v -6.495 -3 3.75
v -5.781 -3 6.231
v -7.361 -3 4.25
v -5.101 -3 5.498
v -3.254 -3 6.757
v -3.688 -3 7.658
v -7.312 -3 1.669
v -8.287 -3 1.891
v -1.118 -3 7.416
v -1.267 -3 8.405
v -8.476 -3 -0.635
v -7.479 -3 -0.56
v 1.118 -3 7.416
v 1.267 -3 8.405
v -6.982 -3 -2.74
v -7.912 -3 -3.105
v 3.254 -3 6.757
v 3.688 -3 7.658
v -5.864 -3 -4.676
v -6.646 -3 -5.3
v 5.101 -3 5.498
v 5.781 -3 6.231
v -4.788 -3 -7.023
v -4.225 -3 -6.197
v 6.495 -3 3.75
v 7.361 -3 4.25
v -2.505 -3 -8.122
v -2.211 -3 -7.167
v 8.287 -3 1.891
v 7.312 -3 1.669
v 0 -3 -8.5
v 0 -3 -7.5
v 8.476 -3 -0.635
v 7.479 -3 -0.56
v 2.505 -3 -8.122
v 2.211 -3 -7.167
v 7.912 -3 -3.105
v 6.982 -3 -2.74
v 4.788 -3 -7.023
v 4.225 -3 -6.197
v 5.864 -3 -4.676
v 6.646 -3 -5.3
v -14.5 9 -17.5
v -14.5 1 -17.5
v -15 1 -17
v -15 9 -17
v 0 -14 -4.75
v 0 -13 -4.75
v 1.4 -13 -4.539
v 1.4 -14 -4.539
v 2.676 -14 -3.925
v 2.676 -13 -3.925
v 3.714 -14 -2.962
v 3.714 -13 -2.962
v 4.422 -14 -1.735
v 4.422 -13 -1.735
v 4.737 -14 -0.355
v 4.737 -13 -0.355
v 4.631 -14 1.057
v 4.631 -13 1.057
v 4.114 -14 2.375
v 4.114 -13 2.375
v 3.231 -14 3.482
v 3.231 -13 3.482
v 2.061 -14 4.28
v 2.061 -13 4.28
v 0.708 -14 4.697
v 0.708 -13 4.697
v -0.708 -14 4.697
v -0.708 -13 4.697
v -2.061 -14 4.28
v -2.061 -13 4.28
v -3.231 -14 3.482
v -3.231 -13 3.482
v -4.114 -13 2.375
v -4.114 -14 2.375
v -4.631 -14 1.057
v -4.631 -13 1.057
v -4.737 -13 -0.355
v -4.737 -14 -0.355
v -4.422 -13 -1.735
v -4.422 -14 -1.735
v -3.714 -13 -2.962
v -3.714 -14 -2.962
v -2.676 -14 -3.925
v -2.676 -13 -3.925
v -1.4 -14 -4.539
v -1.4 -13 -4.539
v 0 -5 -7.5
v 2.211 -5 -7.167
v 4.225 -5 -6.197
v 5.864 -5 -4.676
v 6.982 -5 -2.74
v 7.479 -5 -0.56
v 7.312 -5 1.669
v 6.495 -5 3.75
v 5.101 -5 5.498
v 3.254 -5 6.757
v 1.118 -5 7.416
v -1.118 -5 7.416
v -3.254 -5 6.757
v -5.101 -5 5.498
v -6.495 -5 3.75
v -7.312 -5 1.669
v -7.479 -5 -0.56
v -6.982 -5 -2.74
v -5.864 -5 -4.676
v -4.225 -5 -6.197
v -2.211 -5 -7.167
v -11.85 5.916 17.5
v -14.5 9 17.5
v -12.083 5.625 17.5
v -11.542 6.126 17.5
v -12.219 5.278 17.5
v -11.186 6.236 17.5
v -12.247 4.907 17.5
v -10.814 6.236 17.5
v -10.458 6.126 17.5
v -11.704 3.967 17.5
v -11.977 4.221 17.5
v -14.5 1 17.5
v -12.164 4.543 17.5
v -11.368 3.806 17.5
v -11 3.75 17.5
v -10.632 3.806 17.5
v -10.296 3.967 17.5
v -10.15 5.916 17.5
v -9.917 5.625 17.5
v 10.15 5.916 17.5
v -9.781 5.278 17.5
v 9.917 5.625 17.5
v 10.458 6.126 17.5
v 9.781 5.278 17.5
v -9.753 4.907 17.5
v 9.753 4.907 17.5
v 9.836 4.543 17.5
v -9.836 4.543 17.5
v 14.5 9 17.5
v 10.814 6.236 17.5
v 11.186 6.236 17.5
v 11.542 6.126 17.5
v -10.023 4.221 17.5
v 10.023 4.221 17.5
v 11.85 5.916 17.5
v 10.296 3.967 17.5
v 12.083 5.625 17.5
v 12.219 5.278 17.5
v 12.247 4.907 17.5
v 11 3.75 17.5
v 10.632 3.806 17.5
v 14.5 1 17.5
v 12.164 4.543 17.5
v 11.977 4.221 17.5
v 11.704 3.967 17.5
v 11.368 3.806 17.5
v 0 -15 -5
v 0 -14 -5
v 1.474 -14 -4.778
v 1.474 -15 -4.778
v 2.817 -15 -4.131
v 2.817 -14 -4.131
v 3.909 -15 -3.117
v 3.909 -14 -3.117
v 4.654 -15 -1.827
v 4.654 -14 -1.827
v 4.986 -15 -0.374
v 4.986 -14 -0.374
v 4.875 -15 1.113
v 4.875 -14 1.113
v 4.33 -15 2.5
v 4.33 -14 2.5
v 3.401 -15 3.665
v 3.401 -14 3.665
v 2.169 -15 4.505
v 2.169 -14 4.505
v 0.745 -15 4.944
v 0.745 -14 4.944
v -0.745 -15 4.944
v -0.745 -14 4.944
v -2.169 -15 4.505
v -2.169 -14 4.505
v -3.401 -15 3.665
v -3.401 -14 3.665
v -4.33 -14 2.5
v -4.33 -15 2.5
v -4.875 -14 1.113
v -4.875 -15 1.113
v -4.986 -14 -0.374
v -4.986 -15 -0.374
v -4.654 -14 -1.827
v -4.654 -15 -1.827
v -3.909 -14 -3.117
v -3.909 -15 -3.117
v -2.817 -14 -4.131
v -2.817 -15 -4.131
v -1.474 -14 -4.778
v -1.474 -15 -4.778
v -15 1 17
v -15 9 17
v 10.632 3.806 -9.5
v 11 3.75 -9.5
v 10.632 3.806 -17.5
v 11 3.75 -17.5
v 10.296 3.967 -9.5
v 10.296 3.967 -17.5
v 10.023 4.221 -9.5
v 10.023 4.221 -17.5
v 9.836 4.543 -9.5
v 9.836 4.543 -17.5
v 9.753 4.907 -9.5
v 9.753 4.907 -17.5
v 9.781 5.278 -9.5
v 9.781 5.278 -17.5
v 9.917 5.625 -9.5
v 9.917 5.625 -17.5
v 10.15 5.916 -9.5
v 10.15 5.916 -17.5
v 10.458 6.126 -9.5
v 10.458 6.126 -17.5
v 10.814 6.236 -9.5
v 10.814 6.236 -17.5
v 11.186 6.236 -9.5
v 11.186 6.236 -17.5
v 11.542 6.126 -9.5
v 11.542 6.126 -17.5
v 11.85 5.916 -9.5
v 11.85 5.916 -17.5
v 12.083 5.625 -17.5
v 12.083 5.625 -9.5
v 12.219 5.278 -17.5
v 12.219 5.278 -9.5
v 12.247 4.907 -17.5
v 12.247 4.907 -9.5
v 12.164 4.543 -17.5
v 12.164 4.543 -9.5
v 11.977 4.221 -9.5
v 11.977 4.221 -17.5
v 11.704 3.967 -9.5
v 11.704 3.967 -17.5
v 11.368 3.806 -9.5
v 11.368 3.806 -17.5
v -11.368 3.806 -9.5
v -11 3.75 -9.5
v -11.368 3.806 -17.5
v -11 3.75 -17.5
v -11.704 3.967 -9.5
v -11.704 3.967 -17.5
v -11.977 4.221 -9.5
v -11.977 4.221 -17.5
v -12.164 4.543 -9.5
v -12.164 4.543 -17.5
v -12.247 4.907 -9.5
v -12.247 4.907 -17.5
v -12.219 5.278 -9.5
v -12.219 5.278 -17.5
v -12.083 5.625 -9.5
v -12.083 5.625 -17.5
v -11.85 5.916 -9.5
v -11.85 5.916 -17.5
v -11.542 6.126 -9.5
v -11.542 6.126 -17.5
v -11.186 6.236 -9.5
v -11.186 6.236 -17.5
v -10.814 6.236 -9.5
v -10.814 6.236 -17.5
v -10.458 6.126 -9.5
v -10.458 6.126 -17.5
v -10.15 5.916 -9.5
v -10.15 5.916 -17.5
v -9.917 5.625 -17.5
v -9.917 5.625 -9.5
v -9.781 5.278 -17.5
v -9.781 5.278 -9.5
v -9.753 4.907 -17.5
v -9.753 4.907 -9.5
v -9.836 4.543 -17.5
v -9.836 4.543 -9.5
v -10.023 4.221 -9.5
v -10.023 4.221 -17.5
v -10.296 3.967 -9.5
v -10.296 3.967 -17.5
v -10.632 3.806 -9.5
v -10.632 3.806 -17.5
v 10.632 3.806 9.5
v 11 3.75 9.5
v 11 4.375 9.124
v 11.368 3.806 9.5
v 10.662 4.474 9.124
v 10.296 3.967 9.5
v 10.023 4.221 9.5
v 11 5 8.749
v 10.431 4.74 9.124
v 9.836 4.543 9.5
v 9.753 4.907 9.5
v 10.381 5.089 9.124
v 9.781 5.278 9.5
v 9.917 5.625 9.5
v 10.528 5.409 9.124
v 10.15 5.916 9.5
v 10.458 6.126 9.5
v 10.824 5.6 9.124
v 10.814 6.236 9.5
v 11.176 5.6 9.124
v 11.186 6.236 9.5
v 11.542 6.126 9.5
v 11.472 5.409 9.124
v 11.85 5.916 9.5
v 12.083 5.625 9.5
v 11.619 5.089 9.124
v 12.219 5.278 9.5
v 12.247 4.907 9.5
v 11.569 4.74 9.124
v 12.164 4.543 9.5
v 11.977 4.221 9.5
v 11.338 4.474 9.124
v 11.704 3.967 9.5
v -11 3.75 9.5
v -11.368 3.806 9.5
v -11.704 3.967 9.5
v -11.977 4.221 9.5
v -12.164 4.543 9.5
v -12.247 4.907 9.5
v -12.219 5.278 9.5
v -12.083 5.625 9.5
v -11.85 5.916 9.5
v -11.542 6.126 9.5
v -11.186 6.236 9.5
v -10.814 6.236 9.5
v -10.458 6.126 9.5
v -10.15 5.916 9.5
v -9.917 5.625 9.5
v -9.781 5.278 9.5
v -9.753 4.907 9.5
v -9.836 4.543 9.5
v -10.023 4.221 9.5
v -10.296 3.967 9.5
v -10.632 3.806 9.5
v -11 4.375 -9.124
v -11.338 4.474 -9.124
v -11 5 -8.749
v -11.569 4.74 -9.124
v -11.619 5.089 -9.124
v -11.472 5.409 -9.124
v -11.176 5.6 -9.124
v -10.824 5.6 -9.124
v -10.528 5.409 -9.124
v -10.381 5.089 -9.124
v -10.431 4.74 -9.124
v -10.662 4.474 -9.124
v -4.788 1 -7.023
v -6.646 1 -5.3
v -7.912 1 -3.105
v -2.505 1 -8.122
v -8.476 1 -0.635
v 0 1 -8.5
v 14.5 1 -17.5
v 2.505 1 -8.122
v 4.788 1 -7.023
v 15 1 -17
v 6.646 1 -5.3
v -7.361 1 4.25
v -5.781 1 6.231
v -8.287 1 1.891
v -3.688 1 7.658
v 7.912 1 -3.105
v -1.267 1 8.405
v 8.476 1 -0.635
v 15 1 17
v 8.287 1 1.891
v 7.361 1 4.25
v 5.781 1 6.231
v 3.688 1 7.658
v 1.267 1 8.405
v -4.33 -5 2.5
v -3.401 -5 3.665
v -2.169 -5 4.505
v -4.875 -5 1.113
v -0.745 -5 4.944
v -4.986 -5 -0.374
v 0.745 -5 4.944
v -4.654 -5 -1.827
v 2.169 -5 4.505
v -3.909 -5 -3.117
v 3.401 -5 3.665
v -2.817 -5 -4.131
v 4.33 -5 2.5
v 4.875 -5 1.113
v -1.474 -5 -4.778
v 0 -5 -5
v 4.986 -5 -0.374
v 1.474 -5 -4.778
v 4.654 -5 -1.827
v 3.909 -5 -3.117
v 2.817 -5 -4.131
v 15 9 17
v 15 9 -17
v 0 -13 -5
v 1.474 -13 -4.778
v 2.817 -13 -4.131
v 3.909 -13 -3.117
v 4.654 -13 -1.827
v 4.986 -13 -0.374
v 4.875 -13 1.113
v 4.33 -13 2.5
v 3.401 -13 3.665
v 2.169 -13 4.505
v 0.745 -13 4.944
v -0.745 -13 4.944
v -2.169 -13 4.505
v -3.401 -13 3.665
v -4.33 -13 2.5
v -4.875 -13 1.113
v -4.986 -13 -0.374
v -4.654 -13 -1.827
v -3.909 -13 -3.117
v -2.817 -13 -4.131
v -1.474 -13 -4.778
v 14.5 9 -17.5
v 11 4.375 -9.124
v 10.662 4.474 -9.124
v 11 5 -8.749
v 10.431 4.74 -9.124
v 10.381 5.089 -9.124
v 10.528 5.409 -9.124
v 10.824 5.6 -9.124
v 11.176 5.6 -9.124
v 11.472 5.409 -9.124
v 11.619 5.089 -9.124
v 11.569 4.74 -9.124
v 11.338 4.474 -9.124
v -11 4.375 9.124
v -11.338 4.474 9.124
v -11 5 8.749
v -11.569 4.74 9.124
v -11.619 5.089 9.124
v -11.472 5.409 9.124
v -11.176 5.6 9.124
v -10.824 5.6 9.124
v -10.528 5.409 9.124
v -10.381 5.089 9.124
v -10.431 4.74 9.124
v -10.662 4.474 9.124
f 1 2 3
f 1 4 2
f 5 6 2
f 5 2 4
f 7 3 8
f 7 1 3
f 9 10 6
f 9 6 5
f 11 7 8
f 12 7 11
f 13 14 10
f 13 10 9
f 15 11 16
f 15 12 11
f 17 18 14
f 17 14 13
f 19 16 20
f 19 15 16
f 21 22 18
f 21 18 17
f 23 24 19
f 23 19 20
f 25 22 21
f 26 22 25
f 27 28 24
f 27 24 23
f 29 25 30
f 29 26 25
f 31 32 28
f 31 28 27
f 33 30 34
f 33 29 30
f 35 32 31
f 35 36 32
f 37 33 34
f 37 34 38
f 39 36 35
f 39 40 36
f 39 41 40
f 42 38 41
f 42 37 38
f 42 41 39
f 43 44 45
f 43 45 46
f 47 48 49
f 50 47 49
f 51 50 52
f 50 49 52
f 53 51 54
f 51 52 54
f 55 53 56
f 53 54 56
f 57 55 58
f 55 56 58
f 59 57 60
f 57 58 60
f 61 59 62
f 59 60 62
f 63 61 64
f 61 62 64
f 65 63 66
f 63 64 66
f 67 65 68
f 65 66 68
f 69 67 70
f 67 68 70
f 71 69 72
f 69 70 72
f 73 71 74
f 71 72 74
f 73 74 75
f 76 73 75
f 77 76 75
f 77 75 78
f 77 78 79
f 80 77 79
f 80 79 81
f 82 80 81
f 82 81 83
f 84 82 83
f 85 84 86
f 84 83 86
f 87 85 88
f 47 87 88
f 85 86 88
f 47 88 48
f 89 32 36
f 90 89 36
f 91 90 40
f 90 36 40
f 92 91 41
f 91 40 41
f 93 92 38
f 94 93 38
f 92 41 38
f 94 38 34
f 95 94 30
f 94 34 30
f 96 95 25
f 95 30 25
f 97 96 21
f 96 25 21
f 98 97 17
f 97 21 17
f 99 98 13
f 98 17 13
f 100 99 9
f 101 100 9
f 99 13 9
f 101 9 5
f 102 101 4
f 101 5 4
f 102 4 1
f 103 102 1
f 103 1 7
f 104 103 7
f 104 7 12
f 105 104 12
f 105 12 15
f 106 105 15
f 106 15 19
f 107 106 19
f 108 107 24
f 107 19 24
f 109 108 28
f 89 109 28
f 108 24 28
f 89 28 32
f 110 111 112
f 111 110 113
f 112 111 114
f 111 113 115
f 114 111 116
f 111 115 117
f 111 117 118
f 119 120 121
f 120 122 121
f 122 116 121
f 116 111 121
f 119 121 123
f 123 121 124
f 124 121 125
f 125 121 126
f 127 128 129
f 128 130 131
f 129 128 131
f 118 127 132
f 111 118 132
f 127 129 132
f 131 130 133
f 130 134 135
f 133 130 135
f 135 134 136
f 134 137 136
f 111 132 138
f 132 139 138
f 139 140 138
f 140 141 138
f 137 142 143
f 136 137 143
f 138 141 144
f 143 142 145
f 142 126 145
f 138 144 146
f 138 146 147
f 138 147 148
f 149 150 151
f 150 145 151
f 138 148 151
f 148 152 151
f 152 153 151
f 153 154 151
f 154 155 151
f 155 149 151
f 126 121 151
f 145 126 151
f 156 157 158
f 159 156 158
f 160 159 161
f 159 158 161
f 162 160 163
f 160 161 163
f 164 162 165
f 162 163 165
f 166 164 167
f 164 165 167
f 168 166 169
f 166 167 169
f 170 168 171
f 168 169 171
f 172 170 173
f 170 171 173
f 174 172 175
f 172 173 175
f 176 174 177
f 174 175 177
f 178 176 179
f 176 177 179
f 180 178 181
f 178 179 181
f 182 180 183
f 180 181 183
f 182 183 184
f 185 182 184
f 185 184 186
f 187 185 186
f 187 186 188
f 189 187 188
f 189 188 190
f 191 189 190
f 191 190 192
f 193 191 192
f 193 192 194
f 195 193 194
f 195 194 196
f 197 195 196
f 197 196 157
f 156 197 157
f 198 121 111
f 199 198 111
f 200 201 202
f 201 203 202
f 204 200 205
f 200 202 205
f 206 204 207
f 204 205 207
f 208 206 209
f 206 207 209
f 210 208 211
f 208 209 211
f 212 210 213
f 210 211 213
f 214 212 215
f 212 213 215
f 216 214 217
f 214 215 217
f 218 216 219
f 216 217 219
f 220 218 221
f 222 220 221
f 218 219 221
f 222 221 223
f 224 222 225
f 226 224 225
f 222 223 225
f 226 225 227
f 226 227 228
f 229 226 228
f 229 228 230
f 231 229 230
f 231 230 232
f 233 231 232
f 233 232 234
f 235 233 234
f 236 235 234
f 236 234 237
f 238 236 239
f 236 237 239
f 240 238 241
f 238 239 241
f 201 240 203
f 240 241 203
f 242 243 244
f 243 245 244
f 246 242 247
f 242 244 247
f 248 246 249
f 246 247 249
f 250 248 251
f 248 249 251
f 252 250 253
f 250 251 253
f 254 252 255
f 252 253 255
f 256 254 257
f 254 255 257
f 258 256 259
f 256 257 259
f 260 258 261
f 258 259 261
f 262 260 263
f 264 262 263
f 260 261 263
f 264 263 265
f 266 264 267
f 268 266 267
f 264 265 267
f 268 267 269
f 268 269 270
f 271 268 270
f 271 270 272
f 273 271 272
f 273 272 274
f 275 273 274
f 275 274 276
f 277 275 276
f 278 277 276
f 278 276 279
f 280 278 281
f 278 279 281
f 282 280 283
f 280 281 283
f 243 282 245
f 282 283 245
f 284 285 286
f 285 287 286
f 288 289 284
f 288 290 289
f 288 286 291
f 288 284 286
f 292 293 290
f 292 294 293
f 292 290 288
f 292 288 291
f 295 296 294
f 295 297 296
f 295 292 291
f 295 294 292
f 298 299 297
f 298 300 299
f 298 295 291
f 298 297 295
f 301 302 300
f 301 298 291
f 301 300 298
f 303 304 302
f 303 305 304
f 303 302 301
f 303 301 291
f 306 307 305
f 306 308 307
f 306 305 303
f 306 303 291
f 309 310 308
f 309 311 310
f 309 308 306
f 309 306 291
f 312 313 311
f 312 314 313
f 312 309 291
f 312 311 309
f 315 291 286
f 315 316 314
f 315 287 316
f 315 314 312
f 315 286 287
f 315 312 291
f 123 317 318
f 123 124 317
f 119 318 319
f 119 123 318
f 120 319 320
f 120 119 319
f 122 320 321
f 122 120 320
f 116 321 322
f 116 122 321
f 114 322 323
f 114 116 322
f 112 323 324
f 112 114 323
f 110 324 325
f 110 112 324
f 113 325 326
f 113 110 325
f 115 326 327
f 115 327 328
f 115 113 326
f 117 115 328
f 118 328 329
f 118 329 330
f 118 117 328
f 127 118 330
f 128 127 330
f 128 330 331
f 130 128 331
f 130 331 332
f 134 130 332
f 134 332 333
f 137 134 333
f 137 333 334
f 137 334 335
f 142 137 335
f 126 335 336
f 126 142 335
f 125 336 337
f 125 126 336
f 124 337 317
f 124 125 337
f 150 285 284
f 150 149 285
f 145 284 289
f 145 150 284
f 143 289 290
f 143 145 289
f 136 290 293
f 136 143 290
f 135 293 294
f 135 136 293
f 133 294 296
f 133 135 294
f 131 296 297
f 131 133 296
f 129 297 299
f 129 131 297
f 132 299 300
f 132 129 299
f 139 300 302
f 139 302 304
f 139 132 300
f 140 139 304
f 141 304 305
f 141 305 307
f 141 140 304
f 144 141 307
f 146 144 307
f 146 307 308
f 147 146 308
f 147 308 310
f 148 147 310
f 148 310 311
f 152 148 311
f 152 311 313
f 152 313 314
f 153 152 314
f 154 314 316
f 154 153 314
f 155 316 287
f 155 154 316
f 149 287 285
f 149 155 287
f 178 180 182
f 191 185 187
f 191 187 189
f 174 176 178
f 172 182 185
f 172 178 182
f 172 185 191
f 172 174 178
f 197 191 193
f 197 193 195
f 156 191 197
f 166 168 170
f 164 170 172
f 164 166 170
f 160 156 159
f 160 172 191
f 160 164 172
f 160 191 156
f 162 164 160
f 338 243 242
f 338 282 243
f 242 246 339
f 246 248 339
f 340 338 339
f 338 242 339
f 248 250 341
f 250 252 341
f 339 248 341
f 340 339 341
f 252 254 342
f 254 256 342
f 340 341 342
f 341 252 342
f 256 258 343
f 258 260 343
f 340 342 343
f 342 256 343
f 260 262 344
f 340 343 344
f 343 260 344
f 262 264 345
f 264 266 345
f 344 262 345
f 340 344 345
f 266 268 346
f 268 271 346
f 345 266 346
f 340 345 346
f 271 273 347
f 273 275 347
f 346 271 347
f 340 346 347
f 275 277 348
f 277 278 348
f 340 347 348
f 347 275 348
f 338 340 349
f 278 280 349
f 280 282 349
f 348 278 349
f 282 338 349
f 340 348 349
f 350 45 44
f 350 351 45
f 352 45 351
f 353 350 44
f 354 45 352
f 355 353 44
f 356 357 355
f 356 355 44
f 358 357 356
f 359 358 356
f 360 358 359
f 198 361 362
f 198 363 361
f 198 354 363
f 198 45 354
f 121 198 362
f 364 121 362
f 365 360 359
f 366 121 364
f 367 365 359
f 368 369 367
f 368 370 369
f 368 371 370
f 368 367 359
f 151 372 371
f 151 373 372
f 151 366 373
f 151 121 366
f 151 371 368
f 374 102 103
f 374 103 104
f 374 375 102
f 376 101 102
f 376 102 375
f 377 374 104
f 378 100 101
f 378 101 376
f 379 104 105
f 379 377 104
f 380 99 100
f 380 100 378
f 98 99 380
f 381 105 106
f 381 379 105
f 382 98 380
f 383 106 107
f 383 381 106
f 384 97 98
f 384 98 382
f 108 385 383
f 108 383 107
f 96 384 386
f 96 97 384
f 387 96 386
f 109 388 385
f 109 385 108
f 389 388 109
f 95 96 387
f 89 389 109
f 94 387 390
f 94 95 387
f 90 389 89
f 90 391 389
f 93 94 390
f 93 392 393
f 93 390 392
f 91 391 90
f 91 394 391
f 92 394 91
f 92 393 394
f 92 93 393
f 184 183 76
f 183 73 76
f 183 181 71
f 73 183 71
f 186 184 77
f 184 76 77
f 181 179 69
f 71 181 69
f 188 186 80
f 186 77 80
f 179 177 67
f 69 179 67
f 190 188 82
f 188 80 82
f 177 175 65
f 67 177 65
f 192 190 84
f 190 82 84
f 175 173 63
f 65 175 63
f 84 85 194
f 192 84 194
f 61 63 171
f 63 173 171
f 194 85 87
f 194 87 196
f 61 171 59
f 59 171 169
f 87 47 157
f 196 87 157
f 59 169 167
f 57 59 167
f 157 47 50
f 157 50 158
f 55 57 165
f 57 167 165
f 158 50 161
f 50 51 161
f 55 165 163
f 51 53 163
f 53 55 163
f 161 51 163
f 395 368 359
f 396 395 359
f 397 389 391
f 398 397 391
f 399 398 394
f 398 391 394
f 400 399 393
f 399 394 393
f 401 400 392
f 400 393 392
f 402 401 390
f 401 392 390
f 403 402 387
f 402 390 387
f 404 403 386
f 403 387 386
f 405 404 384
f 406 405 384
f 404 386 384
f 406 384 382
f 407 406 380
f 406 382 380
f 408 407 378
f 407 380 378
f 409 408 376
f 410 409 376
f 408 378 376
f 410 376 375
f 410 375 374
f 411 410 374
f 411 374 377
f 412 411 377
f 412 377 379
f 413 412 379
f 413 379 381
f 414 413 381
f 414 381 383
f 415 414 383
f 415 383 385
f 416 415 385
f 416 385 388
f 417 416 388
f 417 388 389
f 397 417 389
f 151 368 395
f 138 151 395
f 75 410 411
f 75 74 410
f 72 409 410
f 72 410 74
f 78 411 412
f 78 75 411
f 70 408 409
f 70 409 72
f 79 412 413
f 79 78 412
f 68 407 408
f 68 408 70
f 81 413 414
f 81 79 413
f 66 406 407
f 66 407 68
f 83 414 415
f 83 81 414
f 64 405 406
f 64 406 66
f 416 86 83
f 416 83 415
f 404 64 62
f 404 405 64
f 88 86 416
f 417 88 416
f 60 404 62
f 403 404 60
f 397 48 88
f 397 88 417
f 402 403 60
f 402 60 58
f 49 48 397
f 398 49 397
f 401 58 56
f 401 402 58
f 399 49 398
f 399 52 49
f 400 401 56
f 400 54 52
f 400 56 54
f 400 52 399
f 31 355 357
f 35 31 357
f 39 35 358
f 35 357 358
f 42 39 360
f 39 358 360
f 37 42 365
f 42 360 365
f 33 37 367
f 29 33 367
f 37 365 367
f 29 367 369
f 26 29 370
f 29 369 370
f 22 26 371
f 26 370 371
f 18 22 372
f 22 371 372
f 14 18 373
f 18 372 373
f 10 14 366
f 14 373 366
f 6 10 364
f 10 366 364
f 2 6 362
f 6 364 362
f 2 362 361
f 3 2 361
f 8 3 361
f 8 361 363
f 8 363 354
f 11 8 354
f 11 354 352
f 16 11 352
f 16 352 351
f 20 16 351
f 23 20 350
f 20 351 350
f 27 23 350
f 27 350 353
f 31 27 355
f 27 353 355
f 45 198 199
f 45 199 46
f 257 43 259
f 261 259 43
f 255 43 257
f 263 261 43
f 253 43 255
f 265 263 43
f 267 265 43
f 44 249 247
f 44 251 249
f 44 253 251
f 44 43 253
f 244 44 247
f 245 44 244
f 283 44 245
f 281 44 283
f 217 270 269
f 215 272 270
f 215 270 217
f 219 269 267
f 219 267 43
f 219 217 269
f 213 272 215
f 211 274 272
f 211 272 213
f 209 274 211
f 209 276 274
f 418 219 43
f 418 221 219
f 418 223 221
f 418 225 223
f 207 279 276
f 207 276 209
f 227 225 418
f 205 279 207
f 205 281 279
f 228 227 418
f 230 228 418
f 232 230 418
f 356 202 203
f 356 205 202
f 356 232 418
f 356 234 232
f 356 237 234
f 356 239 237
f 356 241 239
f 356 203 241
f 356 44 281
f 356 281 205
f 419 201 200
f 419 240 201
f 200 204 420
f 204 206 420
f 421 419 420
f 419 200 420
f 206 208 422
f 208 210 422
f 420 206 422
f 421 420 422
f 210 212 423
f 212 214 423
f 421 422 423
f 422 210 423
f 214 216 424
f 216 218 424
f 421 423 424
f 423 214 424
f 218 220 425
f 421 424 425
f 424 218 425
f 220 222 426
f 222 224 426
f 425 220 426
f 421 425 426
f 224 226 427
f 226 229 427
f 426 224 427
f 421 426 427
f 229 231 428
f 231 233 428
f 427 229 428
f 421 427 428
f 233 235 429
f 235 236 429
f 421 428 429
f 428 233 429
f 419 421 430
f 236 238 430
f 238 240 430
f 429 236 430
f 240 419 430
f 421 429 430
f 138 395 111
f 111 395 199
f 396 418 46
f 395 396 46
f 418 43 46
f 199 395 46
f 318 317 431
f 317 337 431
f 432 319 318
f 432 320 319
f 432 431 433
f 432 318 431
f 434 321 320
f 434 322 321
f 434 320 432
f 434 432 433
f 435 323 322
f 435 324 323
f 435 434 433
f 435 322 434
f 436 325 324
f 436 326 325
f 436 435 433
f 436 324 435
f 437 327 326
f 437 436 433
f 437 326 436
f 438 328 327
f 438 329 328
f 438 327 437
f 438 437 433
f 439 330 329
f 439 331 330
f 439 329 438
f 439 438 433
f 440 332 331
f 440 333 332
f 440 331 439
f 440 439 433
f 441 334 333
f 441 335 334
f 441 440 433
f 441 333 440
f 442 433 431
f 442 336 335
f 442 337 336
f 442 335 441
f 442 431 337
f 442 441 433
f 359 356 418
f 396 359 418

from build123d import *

# Parameters (mm, degrees)
SKETCH_1_W                  = 30
SKETCH_1_H                  = 35
EXTRUDE_1_DEPTH             = 10
CHAMFER_1_SIZE              = 0.5
SKETCH_7_W                  = 31.194113832
SKETCH_7_H                  = 36.870983812
CUT_EXTRUDE_4_DEPTH         = 1
SKETCH_8_R                  = 5
EXTRUDE_2_DEPTH             = 16
SKETCH_9_R                  = 8.5
SKETCH_9_R_2                = 5
EXTRUDE_3_DEPTH             = 4
SKETCH_10_R                 = 7.5
SKETCH_10_R_2               = 5
EXTRUDE_4_DEPTH             = 2
SKETCH_11_R                 = 5
SKETCH_11_R_2               = 4.75
CUT_EXTRUDE_5_DEPTH         = 1
HOLE_WIZARD_M3_1_AT_2_COUNT = 2
HOLE_WIZARD_M3_1_AT_2_PITCH = 22
SKETCH_13_W                 = 30
SKETCH_13_H                 = 1
CUT_EXTRUDE_6_DEPTH         = 41.926763859


with BuildPart() as part:
    # 草图1 → 凸台-拉伸1 (new body)
    with BuildSketch(Plane(origin=(0, 0, 0), x_dir=(1, 0, 0), z_dir=(0, 1, 0))):
        Rectangle(SKETCH_1_W, SKETCH_1_H)
    extrude(amount=EXTRUDE_1_DEPTH)

    # 倒角1
    chamfer_1_edges = [part.edges().sort_by_distance(p)[0] for p in [
        (15, 5, 17.5),
        (-15, 5, 17.5),
        (-15, 5, -17.5),
        (15, 5, -17.5),
    ]]
    chamfer(chamfer_1_edges, length=CHAMFER_1_SIZE)

    # 草图7 → 切除-拉伸4 (cut)
    with BuildSketch(Plane.XZ):
        Rectangle(SKETCH_7_W, SKETCH_7_H)
    extrude(amount=-CUT_EXTRUDE_4_DEPTH, mode=Mode.SUBTRACT)

    # 草图8 → 凸台-拉伸2 (add)
    with BuildSketch(Plane.XZ.offset(-1)):
        with Locations(Location((0, 0, 0), (0, 0, 270))):
            Circle(SKETCH_8_R)
    extrude(amount=EXTRUDE_2_DEPTH)

    # 草图9 → 凸台-拉伸3 (add)
    with BuildSketch(Plane.XZ.offset(-1)):
        with Locations(Location((0, 0, 0), (0, 0, 270))):
            Circle(SKETCH_9_R)
        with Locations(Location((0, 0, 0), (0, 0, 270))):
            Circle(SKETCH_9_R_2, mode=Mode.SUBTRACT)
    extrude(amount=EXTRUDE_3_DEPTH)

    # 草图10 → 凸台-拉伸4 (add)
    with BuildSketch(Plane.XZ.offset(3)):
        with Locations(Location((0, 0, 0), (0, 0, 270))):
            Circle(SKETCH_10_R)
        with Locations(Location((0, 0, 0), (0, 0, 270))):
            Circle(SKETCH_10_R_2, mode=Mode.SUBTRACT)
    extrude(amount=EXTRUDE_4_DEPTH)

    # 草图11 → 切除-拉伸5 (cut)
    with BuildSketch(Plane(origin=(0, -13, 0), x_dir=(-1, 0, 0), z_dir=(0, -1, 0))):
        with Locations(Location((0, 0, 0), (0, 0, 90))):
            Circle(SKETCH_11_R)
        with Locations(Location((0, 0, 0), (0, 0, 90))):
            Circle(SKETCH_11_R_2, mode=Mode.SUBTRACT)
    extrude(amount=CUT_EXTRUDE_5_DEPTH, mode=Mode.SUBTRACT)

    # 草图12 → M3 螺纹孔1 (revolve, cut)
    with BuildSketch(Plane(origin=(11, 5, 17.5), x_dir=(0, -1, 0), z_dir=(1, 0, 0))):
        Polygon((0, 0), (0, 8.751075774), (1.25, 8), (1.25, 0), align=None)
    hole_wizard_m3_1 = revolve(axis=Axis((11, 5, 23.85), (0, 0, -1)), mode=Mode.SUBTRACT)

    # M3 螺纹孔1 at 2: M3 螺纹孔1 ×2
    with Locations(*[(-i * HOLE_WIZARD_M3_1_AT_2_PITCH, 0, 0) for i in range(1, HOLE_WIZARD_M3_1_AT_2_COUNT)]):
        add(hole_wizard_m3_1, mode=Mode.SUBTRACT)

    # 镜向1: M3 螺纹孔1 across plane
    add(hole_wizard_m3_1.mirror(Plane.XY), mode=Mode.SUBTRACT)

    # 镜向1 copy 1 sketch → 镜向1 copy 1 (revolve, cut)
    with BuildSketch(Plane(origin=(-11, 5, -17.5), x_dir=(0, -1, 0), z_dir=(1, 0, 0))):
        Polygon((0, 0), (0, -8.751075774), (1.25, -8), (1.25, 0), align=None)
    revolve(axis=Axis((-11, 5, -23.85), (0, 0, -1)), mode=Mode.SUBTRACT)

    # 草图13 → 切除-拉伸6 (cut, through all)
    with BuildSketch(Plane(origin=(0, 0, -17.5), x_dir=(-1, 0, 0), z_dir=(0, 0, -1))):
        with Locations((0, 9.5)):
            Rectangle(SKETCH_13_W, SKETCH_13_H)
    extrude(amount=-CUT_EXTRUDE_6_DEPTH, mode=Mode.SUBTRACT)


solid = part.part
